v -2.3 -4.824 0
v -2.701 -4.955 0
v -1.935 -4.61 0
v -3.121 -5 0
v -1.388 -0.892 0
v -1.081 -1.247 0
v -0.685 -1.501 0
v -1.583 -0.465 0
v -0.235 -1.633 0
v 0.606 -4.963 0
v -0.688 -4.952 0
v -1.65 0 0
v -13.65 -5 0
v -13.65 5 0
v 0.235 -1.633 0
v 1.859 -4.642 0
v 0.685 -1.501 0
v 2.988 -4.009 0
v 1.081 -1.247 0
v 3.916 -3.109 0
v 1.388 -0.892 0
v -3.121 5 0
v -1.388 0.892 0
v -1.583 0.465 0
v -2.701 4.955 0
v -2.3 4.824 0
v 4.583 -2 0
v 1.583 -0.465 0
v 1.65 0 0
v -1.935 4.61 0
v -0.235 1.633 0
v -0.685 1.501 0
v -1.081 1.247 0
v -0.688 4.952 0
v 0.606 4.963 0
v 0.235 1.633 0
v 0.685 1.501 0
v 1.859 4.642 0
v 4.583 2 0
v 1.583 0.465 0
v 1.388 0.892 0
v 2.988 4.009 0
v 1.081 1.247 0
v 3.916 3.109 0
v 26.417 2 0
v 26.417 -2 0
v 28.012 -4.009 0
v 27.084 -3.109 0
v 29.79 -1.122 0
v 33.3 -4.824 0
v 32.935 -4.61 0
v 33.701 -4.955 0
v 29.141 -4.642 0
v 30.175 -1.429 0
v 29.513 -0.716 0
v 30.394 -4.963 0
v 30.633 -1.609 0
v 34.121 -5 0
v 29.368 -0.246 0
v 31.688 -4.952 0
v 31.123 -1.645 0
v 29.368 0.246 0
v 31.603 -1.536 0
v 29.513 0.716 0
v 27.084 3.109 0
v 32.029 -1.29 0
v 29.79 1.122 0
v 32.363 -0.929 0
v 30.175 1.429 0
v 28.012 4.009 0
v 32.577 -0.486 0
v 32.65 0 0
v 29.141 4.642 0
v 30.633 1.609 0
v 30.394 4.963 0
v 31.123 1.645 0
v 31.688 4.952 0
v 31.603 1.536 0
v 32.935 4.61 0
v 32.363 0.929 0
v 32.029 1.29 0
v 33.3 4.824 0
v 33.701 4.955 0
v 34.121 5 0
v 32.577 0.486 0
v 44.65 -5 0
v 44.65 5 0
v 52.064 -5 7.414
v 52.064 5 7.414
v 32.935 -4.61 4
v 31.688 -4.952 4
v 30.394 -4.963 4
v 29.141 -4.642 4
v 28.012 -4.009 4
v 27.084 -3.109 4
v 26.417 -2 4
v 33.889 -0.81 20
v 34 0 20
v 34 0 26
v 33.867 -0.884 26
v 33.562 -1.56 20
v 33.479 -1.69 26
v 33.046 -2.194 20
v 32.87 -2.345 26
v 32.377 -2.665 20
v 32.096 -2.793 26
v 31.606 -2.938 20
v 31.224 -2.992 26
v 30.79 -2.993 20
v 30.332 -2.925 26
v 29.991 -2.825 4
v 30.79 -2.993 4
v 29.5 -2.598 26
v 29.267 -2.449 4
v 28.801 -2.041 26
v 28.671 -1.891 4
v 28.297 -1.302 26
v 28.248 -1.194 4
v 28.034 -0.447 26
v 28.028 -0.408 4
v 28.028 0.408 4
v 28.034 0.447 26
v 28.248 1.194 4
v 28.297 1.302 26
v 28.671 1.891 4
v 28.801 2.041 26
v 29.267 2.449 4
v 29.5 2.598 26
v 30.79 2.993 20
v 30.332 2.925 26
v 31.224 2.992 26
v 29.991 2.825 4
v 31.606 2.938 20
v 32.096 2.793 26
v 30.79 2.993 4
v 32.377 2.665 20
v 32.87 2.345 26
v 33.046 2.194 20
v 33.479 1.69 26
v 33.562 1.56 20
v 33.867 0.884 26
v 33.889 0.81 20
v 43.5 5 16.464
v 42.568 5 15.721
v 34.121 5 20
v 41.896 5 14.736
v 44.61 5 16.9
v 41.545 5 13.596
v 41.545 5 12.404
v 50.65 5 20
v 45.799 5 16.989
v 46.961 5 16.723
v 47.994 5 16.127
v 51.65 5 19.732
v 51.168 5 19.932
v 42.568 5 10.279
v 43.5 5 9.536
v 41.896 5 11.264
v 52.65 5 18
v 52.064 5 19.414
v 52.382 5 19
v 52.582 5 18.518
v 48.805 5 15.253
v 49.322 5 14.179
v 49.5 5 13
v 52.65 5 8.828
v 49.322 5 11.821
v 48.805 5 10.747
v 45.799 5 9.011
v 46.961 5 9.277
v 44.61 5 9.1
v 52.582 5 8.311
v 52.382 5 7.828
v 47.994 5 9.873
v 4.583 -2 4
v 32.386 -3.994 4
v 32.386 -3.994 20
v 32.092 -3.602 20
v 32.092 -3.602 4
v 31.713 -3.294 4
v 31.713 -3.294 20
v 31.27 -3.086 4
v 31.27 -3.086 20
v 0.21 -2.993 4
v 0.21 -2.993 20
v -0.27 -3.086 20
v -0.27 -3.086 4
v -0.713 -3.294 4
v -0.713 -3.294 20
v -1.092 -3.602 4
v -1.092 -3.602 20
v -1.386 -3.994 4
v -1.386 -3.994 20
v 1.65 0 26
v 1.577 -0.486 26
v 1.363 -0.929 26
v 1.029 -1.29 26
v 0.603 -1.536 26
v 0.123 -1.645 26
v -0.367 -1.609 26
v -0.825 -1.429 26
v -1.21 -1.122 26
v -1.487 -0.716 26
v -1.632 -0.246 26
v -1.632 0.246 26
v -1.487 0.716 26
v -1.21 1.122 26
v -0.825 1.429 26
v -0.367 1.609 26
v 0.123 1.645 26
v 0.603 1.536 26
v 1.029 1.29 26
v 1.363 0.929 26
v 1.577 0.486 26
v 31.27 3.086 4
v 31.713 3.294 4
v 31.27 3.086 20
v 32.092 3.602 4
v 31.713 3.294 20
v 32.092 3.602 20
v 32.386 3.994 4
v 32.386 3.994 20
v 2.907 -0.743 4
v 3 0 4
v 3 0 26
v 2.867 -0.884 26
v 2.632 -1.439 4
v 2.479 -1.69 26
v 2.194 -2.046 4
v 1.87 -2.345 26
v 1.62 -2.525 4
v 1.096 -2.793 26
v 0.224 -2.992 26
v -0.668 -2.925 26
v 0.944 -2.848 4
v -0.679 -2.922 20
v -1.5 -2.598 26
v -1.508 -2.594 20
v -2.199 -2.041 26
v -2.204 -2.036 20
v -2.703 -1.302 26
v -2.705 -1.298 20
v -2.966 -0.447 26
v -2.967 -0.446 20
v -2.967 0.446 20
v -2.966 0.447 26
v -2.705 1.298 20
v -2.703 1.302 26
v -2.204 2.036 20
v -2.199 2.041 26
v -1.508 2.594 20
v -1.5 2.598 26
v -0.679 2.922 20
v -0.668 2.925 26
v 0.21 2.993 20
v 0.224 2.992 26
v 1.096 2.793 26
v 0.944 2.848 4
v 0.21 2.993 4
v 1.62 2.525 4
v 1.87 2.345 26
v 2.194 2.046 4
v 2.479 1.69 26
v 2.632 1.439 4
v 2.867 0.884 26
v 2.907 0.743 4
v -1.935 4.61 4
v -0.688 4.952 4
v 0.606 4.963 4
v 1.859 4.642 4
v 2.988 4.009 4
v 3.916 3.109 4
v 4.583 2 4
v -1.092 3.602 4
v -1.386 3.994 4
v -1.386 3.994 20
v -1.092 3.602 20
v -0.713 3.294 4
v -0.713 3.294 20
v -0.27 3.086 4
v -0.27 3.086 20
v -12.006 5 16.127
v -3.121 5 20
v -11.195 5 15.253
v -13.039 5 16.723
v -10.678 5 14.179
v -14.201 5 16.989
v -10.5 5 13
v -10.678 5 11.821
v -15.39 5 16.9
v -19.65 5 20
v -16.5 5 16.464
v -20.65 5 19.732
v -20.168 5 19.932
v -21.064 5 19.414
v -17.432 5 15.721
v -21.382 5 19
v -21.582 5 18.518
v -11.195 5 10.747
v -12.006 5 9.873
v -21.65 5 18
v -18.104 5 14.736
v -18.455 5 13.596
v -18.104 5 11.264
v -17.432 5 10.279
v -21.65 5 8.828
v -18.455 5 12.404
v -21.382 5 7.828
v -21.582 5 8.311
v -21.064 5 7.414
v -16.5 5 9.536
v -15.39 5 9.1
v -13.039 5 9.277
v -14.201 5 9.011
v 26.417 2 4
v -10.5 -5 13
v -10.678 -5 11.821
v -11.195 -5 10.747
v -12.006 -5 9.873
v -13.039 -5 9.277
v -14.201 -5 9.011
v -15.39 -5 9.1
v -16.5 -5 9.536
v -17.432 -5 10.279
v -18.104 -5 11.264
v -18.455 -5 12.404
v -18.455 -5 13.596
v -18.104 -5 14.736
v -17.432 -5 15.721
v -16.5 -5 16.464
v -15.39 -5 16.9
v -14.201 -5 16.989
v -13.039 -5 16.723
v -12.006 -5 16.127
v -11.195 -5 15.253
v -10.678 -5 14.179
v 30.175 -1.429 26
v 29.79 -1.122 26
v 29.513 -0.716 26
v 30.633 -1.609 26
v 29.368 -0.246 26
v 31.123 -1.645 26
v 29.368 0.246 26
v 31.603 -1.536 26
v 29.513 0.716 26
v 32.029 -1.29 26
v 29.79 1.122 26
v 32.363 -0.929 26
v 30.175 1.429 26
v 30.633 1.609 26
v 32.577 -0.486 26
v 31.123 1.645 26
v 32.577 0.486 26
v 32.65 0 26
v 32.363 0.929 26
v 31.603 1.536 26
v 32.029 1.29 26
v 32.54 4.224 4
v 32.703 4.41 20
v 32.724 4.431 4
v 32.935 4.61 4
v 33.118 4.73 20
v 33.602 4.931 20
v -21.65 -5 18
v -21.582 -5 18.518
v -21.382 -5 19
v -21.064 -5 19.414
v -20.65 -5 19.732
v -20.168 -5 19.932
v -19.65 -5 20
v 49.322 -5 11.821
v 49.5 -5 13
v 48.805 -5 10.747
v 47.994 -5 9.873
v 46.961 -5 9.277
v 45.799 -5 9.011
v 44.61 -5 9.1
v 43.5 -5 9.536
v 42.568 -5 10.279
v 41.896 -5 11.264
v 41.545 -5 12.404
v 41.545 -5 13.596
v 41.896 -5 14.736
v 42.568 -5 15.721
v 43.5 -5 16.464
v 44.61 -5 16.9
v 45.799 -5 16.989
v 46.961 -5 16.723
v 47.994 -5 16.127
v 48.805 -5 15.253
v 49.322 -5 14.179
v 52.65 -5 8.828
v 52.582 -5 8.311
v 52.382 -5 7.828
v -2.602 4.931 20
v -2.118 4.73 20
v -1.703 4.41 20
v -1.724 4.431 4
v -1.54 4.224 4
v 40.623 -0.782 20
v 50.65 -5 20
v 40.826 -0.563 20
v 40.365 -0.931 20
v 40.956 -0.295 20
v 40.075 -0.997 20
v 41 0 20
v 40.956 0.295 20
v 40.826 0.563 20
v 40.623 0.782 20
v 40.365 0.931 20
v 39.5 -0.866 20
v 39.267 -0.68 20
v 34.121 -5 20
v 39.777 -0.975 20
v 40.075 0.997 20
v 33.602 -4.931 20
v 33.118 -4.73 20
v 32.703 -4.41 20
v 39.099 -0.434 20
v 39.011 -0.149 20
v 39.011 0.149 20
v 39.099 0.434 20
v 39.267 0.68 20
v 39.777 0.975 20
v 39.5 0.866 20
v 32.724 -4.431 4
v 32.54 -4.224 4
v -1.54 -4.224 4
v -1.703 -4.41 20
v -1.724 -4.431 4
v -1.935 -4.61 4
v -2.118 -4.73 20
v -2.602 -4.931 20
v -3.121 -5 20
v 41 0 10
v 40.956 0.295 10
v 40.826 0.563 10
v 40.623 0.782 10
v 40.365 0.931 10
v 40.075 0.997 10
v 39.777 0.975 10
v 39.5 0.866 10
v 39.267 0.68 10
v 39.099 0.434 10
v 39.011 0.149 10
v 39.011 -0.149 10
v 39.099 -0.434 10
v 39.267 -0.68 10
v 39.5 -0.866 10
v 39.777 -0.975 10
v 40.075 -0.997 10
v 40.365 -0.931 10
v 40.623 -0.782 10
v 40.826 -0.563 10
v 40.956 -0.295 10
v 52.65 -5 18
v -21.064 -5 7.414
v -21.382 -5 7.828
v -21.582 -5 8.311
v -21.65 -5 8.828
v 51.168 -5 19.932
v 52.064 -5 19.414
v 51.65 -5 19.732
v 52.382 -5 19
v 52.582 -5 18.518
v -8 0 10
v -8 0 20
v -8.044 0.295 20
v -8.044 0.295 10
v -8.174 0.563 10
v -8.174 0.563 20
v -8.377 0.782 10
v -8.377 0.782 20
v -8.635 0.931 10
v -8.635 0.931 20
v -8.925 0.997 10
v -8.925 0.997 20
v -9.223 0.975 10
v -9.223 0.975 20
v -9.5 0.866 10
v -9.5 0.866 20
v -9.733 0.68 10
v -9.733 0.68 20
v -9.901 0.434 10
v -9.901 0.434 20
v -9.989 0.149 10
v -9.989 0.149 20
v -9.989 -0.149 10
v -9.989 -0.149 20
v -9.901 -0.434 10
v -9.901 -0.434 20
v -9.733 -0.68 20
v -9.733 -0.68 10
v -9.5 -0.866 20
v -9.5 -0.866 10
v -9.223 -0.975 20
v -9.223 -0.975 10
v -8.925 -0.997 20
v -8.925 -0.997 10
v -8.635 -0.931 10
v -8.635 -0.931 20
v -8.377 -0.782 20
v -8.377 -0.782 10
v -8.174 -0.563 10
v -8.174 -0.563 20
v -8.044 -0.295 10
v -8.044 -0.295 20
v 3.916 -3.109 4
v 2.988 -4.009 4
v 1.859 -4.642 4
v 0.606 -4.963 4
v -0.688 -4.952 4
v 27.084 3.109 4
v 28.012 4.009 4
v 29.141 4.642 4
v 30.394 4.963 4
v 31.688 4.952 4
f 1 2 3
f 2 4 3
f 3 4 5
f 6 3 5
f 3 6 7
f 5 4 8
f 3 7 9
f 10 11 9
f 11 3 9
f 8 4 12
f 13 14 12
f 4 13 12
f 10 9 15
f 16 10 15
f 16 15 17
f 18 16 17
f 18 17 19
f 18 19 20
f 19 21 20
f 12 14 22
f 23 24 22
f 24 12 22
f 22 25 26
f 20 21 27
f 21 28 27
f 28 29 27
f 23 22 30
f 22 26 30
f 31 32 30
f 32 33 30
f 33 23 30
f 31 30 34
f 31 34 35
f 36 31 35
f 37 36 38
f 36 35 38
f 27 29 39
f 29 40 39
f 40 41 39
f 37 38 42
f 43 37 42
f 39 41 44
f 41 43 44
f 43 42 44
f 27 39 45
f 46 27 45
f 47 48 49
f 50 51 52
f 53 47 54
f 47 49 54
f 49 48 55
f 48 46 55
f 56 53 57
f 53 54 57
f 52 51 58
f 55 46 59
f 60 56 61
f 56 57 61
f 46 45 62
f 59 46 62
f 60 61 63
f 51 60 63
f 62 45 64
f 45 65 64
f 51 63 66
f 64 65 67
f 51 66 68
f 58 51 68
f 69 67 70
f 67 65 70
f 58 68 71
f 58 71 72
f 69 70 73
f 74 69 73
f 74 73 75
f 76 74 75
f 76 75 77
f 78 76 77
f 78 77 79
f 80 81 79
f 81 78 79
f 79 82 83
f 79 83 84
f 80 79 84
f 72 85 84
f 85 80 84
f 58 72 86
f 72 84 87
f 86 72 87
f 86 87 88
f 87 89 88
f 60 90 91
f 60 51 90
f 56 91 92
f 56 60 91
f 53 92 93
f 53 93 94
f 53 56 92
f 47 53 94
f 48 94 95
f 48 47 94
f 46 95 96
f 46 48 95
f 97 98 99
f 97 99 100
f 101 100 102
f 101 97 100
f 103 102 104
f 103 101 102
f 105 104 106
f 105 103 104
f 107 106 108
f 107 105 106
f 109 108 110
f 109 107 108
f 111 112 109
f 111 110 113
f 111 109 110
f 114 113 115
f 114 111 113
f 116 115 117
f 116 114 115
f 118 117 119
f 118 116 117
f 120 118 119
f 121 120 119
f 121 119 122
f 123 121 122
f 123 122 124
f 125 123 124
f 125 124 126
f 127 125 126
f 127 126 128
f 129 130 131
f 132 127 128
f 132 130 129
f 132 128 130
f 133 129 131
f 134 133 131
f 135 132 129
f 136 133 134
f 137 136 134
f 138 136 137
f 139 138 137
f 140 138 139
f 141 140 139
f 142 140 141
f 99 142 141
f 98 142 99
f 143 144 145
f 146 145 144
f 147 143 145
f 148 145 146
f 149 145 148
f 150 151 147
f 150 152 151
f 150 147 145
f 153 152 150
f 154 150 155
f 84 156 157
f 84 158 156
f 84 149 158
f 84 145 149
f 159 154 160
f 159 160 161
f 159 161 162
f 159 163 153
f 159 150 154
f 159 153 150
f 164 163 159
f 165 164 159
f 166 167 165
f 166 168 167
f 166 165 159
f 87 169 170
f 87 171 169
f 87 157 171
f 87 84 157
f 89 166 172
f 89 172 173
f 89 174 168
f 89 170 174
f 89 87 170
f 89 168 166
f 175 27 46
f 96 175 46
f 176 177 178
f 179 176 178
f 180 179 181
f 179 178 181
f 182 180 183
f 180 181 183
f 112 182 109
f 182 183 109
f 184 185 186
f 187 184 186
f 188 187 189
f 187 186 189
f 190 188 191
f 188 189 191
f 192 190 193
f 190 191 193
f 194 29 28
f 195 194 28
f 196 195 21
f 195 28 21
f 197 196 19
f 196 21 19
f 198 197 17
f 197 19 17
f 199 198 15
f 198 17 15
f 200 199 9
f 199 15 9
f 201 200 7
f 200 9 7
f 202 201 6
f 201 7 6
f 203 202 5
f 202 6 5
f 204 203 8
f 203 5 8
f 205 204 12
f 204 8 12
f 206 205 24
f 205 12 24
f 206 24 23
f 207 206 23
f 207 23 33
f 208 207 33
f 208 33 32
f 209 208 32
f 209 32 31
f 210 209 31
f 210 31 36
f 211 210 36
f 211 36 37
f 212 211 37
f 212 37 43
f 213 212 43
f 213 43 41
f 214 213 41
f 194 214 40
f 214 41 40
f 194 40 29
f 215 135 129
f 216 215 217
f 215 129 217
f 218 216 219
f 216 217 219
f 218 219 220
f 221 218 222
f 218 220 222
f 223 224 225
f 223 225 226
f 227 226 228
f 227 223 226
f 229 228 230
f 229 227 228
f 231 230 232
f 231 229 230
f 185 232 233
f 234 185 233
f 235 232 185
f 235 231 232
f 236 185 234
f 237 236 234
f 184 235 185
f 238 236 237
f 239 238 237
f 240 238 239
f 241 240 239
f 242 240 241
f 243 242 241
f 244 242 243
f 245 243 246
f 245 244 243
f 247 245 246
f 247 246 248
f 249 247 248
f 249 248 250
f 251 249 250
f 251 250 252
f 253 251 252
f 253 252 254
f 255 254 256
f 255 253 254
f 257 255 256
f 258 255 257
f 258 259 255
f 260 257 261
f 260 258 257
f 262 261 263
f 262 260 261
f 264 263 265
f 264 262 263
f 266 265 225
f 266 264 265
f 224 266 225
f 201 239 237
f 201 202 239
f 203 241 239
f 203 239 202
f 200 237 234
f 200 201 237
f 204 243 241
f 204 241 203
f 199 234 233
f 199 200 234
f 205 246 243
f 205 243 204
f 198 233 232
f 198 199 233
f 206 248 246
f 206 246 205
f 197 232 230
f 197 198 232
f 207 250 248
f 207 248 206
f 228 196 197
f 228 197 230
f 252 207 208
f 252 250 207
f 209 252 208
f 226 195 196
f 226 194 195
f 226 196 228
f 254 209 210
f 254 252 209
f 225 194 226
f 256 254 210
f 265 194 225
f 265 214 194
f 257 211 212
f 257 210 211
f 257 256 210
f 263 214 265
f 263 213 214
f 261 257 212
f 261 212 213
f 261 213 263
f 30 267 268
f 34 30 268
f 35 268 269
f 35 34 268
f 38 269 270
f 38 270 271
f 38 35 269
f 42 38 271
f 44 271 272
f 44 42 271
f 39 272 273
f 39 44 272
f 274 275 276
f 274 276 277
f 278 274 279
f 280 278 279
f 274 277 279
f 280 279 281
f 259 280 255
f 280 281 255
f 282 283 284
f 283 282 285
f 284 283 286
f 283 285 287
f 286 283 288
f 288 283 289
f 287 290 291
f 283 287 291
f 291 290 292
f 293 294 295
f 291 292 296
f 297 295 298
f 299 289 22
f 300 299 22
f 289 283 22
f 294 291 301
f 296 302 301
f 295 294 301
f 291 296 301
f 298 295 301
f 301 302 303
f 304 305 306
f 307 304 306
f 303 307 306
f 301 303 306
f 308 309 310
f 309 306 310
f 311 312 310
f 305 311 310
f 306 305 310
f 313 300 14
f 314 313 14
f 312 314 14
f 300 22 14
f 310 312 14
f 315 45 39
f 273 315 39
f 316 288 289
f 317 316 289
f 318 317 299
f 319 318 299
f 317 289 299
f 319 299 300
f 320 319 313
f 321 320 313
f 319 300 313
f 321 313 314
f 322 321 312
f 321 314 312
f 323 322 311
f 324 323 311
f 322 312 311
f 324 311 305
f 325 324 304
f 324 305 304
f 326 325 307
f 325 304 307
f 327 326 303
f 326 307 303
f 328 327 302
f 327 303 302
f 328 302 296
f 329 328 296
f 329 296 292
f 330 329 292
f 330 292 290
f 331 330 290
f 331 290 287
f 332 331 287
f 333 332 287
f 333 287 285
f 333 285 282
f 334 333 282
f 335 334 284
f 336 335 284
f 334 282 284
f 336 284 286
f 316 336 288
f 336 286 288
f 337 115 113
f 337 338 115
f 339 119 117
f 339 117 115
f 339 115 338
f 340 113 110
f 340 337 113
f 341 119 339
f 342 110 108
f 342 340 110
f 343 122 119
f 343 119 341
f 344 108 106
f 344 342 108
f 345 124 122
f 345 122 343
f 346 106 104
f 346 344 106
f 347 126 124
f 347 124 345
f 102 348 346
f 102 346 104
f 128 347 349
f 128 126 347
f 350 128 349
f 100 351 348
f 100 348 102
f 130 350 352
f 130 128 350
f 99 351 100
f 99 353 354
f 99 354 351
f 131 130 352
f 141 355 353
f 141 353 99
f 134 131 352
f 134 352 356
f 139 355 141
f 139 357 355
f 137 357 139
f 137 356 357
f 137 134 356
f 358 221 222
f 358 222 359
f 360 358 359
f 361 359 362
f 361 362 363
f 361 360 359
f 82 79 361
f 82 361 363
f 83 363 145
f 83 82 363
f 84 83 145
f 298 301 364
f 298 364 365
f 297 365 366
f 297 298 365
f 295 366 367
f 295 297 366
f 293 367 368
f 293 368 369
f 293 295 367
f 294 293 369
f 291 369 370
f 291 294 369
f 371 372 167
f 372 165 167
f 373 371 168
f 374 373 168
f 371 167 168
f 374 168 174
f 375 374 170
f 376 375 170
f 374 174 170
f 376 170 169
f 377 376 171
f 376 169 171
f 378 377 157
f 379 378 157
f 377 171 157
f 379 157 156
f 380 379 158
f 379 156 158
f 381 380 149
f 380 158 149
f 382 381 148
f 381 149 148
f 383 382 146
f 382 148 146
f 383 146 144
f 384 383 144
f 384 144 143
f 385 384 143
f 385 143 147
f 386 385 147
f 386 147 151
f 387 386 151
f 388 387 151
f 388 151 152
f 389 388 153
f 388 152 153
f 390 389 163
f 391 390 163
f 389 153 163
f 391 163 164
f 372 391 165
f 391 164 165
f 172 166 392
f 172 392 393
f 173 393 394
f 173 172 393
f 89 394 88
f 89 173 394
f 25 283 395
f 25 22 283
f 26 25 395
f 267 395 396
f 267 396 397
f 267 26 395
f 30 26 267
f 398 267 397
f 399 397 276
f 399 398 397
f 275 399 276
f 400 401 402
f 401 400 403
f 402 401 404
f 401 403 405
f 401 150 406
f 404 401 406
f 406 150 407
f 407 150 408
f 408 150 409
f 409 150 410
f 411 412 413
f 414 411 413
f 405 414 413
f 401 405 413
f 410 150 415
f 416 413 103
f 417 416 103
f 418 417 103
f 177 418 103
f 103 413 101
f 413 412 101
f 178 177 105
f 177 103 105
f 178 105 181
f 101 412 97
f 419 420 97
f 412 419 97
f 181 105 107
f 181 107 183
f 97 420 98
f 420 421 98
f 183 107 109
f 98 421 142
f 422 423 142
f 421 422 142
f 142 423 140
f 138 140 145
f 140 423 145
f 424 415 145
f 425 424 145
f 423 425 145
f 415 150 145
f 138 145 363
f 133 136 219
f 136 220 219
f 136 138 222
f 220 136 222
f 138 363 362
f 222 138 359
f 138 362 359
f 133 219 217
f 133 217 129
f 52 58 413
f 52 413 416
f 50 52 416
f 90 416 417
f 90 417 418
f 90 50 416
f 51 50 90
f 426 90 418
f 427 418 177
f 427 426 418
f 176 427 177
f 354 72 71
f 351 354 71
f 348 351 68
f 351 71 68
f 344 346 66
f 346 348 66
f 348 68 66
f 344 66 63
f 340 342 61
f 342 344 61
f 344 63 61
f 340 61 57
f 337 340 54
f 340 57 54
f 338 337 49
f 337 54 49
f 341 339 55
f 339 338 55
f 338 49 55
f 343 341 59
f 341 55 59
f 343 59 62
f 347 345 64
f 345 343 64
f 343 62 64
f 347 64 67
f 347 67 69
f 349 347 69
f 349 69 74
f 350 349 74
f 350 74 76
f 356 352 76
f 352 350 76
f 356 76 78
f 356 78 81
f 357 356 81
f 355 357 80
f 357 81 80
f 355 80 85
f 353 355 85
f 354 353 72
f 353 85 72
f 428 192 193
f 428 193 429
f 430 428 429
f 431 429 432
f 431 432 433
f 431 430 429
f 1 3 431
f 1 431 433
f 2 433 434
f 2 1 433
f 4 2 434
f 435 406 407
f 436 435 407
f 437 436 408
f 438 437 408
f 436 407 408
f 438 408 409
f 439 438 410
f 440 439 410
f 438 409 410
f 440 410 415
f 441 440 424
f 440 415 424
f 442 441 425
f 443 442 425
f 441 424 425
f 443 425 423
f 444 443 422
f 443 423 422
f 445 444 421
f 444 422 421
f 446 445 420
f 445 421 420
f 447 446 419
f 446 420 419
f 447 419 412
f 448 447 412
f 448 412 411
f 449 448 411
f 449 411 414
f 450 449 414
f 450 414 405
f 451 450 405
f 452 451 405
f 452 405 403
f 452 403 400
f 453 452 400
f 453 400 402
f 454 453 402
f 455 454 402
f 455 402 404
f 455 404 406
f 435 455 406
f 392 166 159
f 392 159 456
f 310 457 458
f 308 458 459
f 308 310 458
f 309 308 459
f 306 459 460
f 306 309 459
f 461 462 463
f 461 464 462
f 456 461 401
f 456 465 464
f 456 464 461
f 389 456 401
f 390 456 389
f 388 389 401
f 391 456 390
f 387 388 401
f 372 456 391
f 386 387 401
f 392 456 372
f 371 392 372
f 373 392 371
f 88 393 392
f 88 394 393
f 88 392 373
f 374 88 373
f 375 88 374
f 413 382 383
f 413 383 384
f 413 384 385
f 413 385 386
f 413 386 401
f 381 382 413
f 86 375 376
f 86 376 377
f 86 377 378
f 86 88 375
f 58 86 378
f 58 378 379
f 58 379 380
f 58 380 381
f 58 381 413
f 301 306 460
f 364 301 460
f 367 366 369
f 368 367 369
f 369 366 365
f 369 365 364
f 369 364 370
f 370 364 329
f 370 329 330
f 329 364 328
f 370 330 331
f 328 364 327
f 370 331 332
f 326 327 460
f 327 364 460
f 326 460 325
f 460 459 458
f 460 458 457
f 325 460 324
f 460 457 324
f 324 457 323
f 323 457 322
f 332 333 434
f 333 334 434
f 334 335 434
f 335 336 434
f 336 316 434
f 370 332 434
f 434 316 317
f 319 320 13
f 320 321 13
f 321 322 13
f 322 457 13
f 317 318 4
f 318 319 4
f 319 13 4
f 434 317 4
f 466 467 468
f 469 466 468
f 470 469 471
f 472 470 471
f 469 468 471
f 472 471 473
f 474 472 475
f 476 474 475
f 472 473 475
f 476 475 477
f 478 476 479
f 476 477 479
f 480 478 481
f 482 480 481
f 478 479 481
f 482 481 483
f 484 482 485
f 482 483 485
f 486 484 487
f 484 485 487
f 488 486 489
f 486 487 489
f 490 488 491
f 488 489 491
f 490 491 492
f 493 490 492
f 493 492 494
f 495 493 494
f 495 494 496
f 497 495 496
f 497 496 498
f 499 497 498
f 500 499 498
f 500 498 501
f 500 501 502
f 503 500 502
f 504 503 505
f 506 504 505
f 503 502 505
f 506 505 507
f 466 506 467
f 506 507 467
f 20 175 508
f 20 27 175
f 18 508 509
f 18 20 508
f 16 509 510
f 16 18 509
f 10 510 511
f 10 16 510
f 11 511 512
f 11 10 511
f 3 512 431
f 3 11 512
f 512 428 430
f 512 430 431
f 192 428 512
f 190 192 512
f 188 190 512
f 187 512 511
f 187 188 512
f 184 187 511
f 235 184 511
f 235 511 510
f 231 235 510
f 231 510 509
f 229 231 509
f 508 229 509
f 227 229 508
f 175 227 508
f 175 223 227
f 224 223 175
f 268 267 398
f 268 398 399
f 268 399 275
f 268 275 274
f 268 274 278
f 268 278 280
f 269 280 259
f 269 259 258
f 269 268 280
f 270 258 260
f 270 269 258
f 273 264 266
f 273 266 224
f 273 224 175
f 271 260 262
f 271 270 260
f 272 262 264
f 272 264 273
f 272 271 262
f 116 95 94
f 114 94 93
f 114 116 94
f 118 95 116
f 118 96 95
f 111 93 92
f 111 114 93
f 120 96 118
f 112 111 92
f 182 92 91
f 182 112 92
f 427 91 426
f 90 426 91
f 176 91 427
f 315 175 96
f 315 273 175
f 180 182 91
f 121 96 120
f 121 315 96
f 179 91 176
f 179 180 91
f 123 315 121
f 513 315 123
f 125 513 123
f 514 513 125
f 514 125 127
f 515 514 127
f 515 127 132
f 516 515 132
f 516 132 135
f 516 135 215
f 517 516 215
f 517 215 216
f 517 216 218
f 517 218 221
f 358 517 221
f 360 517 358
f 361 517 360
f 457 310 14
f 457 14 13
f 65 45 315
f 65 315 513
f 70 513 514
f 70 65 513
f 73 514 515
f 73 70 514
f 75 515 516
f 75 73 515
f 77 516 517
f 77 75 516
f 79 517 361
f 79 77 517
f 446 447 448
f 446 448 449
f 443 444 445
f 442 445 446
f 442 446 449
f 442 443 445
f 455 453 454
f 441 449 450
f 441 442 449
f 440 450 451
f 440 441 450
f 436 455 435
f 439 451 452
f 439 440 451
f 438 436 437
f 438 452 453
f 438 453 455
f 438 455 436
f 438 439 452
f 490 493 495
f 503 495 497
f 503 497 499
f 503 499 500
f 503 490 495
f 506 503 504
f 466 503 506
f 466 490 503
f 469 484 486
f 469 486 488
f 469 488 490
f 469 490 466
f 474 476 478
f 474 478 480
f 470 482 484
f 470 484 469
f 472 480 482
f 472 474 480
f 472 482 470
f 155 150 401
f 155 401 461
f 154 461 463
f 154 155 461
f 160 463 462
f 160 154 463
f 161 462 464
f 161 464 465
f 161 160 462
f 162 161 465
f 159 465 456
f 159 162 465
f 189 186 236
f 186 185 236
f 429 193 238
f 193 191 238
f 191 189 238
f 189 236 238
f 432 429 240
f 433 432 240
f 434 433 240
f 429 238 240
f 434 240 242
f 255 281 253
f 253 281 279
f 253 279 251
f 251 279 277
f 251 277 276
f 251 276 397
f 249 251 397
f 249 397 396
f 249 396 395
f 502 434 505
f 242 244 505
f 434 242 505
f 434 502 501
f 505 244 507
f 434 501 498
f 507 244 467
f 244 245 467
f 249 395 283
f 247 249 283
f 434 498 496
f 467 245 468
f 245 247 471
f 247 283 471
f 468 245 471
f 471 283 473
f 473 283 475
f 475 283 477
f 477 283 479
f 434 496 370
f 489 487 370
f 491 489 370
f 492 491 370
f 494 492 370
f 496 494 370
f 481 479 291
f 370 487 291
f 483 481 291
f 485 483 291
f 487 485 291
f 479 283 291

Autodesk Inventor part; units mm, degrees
ref_plane "YZ Plane" through (0, 0, 0) normal (1, 0, 0) x (0, 1, 0)
ref_plane "XZ Plane" through (0, 0, 0) normal (0, 1, 0) x (-1, 0, 0)
ref_plane "XY Plane" through (0, 0, 0) normal (0, 0, 1) x (1, 0, 0)
sketch "Sketch1" plane through (0, 0, 0) normal (0, 0, 1) x (1, 0, 0)
  circle A0 centre (0, 0) radius 1.65
  circle A1 centre (0, 0) radius 3
  circle A2 centre (31, 0) radius 1.65
  circle A3 centre (31, 0) radius 3
  dimension "d0" = 3.3
  dimension "d1" = 6
  dimension "d22" = 31
extrude "Extrusion1" add sketch "Sketch1" along normal blind 26
sketch "Sketch2" plane through (0, 0, 0) normal (0, 0, -1) x (-1, 0, 0)
  circle A0 centre (0, 0) radius 3 projected
  circle A1 centre (0, 0) radius 5
  circle A2 centre (-31, 0) radius 1.65 projected
  circle A3 centre (-31, 0) radius 5
  circle A4 centre (0, 0) radius 1.65 construction
  line L0 (-29.35, 2) -> (-1.65, 2)
  line L1 (-1.65, 2) -> (-1.65, -2)
  line L2 (-1.65, -2) -> (-29.35, -2)
  line L3 (-29.35, -2) -> (-29.35, 2)
  point P0 (-1.65, 0)
  dimension "d4" = 10
  dimension "d7" = 4
extrude "Extrusion2" add sketch "Sketch2" against normal blind 4 contours A0 L0 A1 L2 | L0 L1 L2 A0 | A0 L2 A1 L0 | A1 L2 A3 L0 | L0 L3 L2 A3 | A3 L2 L3 L0 picked at (-2.1, 0)
sketch "Sketch3" plane through (0, 0, 0) normal (0, 0, -1) x (-1, 0, 0)
  line L0 (-52.65, -5) -> (-32.65, -5)
  line L1 (-32.65, -5) -> (-32.65, 5)
  line L2 (-32.65, 5) -> (-52.65, 5)
  line L3 (-52.65, 5) -> (-52.65, -5)
  line L4 (1.65, 5) -> (21.65, 5)
  line L5 (21.65, 5) -> (21.65, -5)
  line L6 (21.65, -5) -> (1.65, -5)
  line L7 (1.65, -5) -> (1.65, 5)
  circle A0 centre (0, 0) radius 1.65 construction
  circle A1 centre (-31, 0) radius 1.65 construction
  arc A2 (-26.4174, 2) -> (-26.4174, -2) centre (-31, 0) ccw construction
  arc A3 (-4.5826, -2) -> (-4.5826, 2) centre (0, 0) ccw construction
  point P0 (-32.65, 0)
  point P1 (1.65, 0)
  dimension "d8" = 20
  dimension "d10" = 20
extrude "Extrusion3" add sketch "Sketch3" against normal blind 20
sketch "Sketch4" plane through (32.65, 5, 0) normal (0, 1, 0) x (1, 0, 0)
  circle A0 centre (-47.15, -13) radius 4
  circle A1 centre (12.85, -13) radius 4
  line L0 (-34.3, -20) -> (-54.3, -20) projected
  line L1 (20, -20) -> (0, -20) projected
  line L2 (-34.3, 0) -> (-54.3, 0) projected
  line L3 (20, 0) -> (20, -20) projected
  line L4 (-54.3, 0) -> (-54.3, -20) projected
  point P0 (-32.65, 0)
  point P1 (-44.3, -20)
  point P2 (10, -20)
  dimension "d13" = 8
  dimension "d14" = 8
  dimension "d15" = 13
  dimension "d23" = 60
  dimension "d24" = 7.15
  dimension "d25" = 7.15
extrude "Extrusion4" cut sketch "Sketch4" against normal blind 20
chamfer "Chamfer1" distance 8 angle 45 2 edges at (52.65, 0, 0) (-21.65, 0, 0)
fillet "Fillet1" radius 2 12 edges at (32.65, 2.5055, 12) (32.65, -2.5055, 12) (32.65, 5, 10) (-1.65, 2.5055, 12) (-1.65, -2.5055, 12) (-1.65, 5, 10) (-1.65, -5, 10) (32.65, -5, 10) (52.65, 0, 20) (52.65, 0, 8) (-21.65, 0, 8) (-21.65, 0, 20)
sketch "Sketch5" plane through (0, 0, 20) normal (0, 0, 1) x (1, 0, 0)
  line L0 (-19.65, -5) -> (-19.65, 5) projected
  arc A0 (0.21, 2.9926) -> (0.21, -2.9926) centre (0, 0) ccw projected
  circle A1 centre (-9, 0) radius 1
  circle A2 centre (40, 0) radius 1
  arc A3 (30.79, -2.9926) -> (30.79, 2.9926) centre (31, 0) ccw projected
  point P0 (-19.65, 0)
  dimension "d26" = 2
  dimension "d27" = 2
  dimension "d28" = 5
  dimension "d29" = 5
extrude "Extrusion5" cut sketch "Sketch5" against normal blind 10
equation "\"d10\" = d8"
equation "\"d24\" = d25"
equation "\"d29\" = d28"
properties part number "spacer stepperM n rail"
